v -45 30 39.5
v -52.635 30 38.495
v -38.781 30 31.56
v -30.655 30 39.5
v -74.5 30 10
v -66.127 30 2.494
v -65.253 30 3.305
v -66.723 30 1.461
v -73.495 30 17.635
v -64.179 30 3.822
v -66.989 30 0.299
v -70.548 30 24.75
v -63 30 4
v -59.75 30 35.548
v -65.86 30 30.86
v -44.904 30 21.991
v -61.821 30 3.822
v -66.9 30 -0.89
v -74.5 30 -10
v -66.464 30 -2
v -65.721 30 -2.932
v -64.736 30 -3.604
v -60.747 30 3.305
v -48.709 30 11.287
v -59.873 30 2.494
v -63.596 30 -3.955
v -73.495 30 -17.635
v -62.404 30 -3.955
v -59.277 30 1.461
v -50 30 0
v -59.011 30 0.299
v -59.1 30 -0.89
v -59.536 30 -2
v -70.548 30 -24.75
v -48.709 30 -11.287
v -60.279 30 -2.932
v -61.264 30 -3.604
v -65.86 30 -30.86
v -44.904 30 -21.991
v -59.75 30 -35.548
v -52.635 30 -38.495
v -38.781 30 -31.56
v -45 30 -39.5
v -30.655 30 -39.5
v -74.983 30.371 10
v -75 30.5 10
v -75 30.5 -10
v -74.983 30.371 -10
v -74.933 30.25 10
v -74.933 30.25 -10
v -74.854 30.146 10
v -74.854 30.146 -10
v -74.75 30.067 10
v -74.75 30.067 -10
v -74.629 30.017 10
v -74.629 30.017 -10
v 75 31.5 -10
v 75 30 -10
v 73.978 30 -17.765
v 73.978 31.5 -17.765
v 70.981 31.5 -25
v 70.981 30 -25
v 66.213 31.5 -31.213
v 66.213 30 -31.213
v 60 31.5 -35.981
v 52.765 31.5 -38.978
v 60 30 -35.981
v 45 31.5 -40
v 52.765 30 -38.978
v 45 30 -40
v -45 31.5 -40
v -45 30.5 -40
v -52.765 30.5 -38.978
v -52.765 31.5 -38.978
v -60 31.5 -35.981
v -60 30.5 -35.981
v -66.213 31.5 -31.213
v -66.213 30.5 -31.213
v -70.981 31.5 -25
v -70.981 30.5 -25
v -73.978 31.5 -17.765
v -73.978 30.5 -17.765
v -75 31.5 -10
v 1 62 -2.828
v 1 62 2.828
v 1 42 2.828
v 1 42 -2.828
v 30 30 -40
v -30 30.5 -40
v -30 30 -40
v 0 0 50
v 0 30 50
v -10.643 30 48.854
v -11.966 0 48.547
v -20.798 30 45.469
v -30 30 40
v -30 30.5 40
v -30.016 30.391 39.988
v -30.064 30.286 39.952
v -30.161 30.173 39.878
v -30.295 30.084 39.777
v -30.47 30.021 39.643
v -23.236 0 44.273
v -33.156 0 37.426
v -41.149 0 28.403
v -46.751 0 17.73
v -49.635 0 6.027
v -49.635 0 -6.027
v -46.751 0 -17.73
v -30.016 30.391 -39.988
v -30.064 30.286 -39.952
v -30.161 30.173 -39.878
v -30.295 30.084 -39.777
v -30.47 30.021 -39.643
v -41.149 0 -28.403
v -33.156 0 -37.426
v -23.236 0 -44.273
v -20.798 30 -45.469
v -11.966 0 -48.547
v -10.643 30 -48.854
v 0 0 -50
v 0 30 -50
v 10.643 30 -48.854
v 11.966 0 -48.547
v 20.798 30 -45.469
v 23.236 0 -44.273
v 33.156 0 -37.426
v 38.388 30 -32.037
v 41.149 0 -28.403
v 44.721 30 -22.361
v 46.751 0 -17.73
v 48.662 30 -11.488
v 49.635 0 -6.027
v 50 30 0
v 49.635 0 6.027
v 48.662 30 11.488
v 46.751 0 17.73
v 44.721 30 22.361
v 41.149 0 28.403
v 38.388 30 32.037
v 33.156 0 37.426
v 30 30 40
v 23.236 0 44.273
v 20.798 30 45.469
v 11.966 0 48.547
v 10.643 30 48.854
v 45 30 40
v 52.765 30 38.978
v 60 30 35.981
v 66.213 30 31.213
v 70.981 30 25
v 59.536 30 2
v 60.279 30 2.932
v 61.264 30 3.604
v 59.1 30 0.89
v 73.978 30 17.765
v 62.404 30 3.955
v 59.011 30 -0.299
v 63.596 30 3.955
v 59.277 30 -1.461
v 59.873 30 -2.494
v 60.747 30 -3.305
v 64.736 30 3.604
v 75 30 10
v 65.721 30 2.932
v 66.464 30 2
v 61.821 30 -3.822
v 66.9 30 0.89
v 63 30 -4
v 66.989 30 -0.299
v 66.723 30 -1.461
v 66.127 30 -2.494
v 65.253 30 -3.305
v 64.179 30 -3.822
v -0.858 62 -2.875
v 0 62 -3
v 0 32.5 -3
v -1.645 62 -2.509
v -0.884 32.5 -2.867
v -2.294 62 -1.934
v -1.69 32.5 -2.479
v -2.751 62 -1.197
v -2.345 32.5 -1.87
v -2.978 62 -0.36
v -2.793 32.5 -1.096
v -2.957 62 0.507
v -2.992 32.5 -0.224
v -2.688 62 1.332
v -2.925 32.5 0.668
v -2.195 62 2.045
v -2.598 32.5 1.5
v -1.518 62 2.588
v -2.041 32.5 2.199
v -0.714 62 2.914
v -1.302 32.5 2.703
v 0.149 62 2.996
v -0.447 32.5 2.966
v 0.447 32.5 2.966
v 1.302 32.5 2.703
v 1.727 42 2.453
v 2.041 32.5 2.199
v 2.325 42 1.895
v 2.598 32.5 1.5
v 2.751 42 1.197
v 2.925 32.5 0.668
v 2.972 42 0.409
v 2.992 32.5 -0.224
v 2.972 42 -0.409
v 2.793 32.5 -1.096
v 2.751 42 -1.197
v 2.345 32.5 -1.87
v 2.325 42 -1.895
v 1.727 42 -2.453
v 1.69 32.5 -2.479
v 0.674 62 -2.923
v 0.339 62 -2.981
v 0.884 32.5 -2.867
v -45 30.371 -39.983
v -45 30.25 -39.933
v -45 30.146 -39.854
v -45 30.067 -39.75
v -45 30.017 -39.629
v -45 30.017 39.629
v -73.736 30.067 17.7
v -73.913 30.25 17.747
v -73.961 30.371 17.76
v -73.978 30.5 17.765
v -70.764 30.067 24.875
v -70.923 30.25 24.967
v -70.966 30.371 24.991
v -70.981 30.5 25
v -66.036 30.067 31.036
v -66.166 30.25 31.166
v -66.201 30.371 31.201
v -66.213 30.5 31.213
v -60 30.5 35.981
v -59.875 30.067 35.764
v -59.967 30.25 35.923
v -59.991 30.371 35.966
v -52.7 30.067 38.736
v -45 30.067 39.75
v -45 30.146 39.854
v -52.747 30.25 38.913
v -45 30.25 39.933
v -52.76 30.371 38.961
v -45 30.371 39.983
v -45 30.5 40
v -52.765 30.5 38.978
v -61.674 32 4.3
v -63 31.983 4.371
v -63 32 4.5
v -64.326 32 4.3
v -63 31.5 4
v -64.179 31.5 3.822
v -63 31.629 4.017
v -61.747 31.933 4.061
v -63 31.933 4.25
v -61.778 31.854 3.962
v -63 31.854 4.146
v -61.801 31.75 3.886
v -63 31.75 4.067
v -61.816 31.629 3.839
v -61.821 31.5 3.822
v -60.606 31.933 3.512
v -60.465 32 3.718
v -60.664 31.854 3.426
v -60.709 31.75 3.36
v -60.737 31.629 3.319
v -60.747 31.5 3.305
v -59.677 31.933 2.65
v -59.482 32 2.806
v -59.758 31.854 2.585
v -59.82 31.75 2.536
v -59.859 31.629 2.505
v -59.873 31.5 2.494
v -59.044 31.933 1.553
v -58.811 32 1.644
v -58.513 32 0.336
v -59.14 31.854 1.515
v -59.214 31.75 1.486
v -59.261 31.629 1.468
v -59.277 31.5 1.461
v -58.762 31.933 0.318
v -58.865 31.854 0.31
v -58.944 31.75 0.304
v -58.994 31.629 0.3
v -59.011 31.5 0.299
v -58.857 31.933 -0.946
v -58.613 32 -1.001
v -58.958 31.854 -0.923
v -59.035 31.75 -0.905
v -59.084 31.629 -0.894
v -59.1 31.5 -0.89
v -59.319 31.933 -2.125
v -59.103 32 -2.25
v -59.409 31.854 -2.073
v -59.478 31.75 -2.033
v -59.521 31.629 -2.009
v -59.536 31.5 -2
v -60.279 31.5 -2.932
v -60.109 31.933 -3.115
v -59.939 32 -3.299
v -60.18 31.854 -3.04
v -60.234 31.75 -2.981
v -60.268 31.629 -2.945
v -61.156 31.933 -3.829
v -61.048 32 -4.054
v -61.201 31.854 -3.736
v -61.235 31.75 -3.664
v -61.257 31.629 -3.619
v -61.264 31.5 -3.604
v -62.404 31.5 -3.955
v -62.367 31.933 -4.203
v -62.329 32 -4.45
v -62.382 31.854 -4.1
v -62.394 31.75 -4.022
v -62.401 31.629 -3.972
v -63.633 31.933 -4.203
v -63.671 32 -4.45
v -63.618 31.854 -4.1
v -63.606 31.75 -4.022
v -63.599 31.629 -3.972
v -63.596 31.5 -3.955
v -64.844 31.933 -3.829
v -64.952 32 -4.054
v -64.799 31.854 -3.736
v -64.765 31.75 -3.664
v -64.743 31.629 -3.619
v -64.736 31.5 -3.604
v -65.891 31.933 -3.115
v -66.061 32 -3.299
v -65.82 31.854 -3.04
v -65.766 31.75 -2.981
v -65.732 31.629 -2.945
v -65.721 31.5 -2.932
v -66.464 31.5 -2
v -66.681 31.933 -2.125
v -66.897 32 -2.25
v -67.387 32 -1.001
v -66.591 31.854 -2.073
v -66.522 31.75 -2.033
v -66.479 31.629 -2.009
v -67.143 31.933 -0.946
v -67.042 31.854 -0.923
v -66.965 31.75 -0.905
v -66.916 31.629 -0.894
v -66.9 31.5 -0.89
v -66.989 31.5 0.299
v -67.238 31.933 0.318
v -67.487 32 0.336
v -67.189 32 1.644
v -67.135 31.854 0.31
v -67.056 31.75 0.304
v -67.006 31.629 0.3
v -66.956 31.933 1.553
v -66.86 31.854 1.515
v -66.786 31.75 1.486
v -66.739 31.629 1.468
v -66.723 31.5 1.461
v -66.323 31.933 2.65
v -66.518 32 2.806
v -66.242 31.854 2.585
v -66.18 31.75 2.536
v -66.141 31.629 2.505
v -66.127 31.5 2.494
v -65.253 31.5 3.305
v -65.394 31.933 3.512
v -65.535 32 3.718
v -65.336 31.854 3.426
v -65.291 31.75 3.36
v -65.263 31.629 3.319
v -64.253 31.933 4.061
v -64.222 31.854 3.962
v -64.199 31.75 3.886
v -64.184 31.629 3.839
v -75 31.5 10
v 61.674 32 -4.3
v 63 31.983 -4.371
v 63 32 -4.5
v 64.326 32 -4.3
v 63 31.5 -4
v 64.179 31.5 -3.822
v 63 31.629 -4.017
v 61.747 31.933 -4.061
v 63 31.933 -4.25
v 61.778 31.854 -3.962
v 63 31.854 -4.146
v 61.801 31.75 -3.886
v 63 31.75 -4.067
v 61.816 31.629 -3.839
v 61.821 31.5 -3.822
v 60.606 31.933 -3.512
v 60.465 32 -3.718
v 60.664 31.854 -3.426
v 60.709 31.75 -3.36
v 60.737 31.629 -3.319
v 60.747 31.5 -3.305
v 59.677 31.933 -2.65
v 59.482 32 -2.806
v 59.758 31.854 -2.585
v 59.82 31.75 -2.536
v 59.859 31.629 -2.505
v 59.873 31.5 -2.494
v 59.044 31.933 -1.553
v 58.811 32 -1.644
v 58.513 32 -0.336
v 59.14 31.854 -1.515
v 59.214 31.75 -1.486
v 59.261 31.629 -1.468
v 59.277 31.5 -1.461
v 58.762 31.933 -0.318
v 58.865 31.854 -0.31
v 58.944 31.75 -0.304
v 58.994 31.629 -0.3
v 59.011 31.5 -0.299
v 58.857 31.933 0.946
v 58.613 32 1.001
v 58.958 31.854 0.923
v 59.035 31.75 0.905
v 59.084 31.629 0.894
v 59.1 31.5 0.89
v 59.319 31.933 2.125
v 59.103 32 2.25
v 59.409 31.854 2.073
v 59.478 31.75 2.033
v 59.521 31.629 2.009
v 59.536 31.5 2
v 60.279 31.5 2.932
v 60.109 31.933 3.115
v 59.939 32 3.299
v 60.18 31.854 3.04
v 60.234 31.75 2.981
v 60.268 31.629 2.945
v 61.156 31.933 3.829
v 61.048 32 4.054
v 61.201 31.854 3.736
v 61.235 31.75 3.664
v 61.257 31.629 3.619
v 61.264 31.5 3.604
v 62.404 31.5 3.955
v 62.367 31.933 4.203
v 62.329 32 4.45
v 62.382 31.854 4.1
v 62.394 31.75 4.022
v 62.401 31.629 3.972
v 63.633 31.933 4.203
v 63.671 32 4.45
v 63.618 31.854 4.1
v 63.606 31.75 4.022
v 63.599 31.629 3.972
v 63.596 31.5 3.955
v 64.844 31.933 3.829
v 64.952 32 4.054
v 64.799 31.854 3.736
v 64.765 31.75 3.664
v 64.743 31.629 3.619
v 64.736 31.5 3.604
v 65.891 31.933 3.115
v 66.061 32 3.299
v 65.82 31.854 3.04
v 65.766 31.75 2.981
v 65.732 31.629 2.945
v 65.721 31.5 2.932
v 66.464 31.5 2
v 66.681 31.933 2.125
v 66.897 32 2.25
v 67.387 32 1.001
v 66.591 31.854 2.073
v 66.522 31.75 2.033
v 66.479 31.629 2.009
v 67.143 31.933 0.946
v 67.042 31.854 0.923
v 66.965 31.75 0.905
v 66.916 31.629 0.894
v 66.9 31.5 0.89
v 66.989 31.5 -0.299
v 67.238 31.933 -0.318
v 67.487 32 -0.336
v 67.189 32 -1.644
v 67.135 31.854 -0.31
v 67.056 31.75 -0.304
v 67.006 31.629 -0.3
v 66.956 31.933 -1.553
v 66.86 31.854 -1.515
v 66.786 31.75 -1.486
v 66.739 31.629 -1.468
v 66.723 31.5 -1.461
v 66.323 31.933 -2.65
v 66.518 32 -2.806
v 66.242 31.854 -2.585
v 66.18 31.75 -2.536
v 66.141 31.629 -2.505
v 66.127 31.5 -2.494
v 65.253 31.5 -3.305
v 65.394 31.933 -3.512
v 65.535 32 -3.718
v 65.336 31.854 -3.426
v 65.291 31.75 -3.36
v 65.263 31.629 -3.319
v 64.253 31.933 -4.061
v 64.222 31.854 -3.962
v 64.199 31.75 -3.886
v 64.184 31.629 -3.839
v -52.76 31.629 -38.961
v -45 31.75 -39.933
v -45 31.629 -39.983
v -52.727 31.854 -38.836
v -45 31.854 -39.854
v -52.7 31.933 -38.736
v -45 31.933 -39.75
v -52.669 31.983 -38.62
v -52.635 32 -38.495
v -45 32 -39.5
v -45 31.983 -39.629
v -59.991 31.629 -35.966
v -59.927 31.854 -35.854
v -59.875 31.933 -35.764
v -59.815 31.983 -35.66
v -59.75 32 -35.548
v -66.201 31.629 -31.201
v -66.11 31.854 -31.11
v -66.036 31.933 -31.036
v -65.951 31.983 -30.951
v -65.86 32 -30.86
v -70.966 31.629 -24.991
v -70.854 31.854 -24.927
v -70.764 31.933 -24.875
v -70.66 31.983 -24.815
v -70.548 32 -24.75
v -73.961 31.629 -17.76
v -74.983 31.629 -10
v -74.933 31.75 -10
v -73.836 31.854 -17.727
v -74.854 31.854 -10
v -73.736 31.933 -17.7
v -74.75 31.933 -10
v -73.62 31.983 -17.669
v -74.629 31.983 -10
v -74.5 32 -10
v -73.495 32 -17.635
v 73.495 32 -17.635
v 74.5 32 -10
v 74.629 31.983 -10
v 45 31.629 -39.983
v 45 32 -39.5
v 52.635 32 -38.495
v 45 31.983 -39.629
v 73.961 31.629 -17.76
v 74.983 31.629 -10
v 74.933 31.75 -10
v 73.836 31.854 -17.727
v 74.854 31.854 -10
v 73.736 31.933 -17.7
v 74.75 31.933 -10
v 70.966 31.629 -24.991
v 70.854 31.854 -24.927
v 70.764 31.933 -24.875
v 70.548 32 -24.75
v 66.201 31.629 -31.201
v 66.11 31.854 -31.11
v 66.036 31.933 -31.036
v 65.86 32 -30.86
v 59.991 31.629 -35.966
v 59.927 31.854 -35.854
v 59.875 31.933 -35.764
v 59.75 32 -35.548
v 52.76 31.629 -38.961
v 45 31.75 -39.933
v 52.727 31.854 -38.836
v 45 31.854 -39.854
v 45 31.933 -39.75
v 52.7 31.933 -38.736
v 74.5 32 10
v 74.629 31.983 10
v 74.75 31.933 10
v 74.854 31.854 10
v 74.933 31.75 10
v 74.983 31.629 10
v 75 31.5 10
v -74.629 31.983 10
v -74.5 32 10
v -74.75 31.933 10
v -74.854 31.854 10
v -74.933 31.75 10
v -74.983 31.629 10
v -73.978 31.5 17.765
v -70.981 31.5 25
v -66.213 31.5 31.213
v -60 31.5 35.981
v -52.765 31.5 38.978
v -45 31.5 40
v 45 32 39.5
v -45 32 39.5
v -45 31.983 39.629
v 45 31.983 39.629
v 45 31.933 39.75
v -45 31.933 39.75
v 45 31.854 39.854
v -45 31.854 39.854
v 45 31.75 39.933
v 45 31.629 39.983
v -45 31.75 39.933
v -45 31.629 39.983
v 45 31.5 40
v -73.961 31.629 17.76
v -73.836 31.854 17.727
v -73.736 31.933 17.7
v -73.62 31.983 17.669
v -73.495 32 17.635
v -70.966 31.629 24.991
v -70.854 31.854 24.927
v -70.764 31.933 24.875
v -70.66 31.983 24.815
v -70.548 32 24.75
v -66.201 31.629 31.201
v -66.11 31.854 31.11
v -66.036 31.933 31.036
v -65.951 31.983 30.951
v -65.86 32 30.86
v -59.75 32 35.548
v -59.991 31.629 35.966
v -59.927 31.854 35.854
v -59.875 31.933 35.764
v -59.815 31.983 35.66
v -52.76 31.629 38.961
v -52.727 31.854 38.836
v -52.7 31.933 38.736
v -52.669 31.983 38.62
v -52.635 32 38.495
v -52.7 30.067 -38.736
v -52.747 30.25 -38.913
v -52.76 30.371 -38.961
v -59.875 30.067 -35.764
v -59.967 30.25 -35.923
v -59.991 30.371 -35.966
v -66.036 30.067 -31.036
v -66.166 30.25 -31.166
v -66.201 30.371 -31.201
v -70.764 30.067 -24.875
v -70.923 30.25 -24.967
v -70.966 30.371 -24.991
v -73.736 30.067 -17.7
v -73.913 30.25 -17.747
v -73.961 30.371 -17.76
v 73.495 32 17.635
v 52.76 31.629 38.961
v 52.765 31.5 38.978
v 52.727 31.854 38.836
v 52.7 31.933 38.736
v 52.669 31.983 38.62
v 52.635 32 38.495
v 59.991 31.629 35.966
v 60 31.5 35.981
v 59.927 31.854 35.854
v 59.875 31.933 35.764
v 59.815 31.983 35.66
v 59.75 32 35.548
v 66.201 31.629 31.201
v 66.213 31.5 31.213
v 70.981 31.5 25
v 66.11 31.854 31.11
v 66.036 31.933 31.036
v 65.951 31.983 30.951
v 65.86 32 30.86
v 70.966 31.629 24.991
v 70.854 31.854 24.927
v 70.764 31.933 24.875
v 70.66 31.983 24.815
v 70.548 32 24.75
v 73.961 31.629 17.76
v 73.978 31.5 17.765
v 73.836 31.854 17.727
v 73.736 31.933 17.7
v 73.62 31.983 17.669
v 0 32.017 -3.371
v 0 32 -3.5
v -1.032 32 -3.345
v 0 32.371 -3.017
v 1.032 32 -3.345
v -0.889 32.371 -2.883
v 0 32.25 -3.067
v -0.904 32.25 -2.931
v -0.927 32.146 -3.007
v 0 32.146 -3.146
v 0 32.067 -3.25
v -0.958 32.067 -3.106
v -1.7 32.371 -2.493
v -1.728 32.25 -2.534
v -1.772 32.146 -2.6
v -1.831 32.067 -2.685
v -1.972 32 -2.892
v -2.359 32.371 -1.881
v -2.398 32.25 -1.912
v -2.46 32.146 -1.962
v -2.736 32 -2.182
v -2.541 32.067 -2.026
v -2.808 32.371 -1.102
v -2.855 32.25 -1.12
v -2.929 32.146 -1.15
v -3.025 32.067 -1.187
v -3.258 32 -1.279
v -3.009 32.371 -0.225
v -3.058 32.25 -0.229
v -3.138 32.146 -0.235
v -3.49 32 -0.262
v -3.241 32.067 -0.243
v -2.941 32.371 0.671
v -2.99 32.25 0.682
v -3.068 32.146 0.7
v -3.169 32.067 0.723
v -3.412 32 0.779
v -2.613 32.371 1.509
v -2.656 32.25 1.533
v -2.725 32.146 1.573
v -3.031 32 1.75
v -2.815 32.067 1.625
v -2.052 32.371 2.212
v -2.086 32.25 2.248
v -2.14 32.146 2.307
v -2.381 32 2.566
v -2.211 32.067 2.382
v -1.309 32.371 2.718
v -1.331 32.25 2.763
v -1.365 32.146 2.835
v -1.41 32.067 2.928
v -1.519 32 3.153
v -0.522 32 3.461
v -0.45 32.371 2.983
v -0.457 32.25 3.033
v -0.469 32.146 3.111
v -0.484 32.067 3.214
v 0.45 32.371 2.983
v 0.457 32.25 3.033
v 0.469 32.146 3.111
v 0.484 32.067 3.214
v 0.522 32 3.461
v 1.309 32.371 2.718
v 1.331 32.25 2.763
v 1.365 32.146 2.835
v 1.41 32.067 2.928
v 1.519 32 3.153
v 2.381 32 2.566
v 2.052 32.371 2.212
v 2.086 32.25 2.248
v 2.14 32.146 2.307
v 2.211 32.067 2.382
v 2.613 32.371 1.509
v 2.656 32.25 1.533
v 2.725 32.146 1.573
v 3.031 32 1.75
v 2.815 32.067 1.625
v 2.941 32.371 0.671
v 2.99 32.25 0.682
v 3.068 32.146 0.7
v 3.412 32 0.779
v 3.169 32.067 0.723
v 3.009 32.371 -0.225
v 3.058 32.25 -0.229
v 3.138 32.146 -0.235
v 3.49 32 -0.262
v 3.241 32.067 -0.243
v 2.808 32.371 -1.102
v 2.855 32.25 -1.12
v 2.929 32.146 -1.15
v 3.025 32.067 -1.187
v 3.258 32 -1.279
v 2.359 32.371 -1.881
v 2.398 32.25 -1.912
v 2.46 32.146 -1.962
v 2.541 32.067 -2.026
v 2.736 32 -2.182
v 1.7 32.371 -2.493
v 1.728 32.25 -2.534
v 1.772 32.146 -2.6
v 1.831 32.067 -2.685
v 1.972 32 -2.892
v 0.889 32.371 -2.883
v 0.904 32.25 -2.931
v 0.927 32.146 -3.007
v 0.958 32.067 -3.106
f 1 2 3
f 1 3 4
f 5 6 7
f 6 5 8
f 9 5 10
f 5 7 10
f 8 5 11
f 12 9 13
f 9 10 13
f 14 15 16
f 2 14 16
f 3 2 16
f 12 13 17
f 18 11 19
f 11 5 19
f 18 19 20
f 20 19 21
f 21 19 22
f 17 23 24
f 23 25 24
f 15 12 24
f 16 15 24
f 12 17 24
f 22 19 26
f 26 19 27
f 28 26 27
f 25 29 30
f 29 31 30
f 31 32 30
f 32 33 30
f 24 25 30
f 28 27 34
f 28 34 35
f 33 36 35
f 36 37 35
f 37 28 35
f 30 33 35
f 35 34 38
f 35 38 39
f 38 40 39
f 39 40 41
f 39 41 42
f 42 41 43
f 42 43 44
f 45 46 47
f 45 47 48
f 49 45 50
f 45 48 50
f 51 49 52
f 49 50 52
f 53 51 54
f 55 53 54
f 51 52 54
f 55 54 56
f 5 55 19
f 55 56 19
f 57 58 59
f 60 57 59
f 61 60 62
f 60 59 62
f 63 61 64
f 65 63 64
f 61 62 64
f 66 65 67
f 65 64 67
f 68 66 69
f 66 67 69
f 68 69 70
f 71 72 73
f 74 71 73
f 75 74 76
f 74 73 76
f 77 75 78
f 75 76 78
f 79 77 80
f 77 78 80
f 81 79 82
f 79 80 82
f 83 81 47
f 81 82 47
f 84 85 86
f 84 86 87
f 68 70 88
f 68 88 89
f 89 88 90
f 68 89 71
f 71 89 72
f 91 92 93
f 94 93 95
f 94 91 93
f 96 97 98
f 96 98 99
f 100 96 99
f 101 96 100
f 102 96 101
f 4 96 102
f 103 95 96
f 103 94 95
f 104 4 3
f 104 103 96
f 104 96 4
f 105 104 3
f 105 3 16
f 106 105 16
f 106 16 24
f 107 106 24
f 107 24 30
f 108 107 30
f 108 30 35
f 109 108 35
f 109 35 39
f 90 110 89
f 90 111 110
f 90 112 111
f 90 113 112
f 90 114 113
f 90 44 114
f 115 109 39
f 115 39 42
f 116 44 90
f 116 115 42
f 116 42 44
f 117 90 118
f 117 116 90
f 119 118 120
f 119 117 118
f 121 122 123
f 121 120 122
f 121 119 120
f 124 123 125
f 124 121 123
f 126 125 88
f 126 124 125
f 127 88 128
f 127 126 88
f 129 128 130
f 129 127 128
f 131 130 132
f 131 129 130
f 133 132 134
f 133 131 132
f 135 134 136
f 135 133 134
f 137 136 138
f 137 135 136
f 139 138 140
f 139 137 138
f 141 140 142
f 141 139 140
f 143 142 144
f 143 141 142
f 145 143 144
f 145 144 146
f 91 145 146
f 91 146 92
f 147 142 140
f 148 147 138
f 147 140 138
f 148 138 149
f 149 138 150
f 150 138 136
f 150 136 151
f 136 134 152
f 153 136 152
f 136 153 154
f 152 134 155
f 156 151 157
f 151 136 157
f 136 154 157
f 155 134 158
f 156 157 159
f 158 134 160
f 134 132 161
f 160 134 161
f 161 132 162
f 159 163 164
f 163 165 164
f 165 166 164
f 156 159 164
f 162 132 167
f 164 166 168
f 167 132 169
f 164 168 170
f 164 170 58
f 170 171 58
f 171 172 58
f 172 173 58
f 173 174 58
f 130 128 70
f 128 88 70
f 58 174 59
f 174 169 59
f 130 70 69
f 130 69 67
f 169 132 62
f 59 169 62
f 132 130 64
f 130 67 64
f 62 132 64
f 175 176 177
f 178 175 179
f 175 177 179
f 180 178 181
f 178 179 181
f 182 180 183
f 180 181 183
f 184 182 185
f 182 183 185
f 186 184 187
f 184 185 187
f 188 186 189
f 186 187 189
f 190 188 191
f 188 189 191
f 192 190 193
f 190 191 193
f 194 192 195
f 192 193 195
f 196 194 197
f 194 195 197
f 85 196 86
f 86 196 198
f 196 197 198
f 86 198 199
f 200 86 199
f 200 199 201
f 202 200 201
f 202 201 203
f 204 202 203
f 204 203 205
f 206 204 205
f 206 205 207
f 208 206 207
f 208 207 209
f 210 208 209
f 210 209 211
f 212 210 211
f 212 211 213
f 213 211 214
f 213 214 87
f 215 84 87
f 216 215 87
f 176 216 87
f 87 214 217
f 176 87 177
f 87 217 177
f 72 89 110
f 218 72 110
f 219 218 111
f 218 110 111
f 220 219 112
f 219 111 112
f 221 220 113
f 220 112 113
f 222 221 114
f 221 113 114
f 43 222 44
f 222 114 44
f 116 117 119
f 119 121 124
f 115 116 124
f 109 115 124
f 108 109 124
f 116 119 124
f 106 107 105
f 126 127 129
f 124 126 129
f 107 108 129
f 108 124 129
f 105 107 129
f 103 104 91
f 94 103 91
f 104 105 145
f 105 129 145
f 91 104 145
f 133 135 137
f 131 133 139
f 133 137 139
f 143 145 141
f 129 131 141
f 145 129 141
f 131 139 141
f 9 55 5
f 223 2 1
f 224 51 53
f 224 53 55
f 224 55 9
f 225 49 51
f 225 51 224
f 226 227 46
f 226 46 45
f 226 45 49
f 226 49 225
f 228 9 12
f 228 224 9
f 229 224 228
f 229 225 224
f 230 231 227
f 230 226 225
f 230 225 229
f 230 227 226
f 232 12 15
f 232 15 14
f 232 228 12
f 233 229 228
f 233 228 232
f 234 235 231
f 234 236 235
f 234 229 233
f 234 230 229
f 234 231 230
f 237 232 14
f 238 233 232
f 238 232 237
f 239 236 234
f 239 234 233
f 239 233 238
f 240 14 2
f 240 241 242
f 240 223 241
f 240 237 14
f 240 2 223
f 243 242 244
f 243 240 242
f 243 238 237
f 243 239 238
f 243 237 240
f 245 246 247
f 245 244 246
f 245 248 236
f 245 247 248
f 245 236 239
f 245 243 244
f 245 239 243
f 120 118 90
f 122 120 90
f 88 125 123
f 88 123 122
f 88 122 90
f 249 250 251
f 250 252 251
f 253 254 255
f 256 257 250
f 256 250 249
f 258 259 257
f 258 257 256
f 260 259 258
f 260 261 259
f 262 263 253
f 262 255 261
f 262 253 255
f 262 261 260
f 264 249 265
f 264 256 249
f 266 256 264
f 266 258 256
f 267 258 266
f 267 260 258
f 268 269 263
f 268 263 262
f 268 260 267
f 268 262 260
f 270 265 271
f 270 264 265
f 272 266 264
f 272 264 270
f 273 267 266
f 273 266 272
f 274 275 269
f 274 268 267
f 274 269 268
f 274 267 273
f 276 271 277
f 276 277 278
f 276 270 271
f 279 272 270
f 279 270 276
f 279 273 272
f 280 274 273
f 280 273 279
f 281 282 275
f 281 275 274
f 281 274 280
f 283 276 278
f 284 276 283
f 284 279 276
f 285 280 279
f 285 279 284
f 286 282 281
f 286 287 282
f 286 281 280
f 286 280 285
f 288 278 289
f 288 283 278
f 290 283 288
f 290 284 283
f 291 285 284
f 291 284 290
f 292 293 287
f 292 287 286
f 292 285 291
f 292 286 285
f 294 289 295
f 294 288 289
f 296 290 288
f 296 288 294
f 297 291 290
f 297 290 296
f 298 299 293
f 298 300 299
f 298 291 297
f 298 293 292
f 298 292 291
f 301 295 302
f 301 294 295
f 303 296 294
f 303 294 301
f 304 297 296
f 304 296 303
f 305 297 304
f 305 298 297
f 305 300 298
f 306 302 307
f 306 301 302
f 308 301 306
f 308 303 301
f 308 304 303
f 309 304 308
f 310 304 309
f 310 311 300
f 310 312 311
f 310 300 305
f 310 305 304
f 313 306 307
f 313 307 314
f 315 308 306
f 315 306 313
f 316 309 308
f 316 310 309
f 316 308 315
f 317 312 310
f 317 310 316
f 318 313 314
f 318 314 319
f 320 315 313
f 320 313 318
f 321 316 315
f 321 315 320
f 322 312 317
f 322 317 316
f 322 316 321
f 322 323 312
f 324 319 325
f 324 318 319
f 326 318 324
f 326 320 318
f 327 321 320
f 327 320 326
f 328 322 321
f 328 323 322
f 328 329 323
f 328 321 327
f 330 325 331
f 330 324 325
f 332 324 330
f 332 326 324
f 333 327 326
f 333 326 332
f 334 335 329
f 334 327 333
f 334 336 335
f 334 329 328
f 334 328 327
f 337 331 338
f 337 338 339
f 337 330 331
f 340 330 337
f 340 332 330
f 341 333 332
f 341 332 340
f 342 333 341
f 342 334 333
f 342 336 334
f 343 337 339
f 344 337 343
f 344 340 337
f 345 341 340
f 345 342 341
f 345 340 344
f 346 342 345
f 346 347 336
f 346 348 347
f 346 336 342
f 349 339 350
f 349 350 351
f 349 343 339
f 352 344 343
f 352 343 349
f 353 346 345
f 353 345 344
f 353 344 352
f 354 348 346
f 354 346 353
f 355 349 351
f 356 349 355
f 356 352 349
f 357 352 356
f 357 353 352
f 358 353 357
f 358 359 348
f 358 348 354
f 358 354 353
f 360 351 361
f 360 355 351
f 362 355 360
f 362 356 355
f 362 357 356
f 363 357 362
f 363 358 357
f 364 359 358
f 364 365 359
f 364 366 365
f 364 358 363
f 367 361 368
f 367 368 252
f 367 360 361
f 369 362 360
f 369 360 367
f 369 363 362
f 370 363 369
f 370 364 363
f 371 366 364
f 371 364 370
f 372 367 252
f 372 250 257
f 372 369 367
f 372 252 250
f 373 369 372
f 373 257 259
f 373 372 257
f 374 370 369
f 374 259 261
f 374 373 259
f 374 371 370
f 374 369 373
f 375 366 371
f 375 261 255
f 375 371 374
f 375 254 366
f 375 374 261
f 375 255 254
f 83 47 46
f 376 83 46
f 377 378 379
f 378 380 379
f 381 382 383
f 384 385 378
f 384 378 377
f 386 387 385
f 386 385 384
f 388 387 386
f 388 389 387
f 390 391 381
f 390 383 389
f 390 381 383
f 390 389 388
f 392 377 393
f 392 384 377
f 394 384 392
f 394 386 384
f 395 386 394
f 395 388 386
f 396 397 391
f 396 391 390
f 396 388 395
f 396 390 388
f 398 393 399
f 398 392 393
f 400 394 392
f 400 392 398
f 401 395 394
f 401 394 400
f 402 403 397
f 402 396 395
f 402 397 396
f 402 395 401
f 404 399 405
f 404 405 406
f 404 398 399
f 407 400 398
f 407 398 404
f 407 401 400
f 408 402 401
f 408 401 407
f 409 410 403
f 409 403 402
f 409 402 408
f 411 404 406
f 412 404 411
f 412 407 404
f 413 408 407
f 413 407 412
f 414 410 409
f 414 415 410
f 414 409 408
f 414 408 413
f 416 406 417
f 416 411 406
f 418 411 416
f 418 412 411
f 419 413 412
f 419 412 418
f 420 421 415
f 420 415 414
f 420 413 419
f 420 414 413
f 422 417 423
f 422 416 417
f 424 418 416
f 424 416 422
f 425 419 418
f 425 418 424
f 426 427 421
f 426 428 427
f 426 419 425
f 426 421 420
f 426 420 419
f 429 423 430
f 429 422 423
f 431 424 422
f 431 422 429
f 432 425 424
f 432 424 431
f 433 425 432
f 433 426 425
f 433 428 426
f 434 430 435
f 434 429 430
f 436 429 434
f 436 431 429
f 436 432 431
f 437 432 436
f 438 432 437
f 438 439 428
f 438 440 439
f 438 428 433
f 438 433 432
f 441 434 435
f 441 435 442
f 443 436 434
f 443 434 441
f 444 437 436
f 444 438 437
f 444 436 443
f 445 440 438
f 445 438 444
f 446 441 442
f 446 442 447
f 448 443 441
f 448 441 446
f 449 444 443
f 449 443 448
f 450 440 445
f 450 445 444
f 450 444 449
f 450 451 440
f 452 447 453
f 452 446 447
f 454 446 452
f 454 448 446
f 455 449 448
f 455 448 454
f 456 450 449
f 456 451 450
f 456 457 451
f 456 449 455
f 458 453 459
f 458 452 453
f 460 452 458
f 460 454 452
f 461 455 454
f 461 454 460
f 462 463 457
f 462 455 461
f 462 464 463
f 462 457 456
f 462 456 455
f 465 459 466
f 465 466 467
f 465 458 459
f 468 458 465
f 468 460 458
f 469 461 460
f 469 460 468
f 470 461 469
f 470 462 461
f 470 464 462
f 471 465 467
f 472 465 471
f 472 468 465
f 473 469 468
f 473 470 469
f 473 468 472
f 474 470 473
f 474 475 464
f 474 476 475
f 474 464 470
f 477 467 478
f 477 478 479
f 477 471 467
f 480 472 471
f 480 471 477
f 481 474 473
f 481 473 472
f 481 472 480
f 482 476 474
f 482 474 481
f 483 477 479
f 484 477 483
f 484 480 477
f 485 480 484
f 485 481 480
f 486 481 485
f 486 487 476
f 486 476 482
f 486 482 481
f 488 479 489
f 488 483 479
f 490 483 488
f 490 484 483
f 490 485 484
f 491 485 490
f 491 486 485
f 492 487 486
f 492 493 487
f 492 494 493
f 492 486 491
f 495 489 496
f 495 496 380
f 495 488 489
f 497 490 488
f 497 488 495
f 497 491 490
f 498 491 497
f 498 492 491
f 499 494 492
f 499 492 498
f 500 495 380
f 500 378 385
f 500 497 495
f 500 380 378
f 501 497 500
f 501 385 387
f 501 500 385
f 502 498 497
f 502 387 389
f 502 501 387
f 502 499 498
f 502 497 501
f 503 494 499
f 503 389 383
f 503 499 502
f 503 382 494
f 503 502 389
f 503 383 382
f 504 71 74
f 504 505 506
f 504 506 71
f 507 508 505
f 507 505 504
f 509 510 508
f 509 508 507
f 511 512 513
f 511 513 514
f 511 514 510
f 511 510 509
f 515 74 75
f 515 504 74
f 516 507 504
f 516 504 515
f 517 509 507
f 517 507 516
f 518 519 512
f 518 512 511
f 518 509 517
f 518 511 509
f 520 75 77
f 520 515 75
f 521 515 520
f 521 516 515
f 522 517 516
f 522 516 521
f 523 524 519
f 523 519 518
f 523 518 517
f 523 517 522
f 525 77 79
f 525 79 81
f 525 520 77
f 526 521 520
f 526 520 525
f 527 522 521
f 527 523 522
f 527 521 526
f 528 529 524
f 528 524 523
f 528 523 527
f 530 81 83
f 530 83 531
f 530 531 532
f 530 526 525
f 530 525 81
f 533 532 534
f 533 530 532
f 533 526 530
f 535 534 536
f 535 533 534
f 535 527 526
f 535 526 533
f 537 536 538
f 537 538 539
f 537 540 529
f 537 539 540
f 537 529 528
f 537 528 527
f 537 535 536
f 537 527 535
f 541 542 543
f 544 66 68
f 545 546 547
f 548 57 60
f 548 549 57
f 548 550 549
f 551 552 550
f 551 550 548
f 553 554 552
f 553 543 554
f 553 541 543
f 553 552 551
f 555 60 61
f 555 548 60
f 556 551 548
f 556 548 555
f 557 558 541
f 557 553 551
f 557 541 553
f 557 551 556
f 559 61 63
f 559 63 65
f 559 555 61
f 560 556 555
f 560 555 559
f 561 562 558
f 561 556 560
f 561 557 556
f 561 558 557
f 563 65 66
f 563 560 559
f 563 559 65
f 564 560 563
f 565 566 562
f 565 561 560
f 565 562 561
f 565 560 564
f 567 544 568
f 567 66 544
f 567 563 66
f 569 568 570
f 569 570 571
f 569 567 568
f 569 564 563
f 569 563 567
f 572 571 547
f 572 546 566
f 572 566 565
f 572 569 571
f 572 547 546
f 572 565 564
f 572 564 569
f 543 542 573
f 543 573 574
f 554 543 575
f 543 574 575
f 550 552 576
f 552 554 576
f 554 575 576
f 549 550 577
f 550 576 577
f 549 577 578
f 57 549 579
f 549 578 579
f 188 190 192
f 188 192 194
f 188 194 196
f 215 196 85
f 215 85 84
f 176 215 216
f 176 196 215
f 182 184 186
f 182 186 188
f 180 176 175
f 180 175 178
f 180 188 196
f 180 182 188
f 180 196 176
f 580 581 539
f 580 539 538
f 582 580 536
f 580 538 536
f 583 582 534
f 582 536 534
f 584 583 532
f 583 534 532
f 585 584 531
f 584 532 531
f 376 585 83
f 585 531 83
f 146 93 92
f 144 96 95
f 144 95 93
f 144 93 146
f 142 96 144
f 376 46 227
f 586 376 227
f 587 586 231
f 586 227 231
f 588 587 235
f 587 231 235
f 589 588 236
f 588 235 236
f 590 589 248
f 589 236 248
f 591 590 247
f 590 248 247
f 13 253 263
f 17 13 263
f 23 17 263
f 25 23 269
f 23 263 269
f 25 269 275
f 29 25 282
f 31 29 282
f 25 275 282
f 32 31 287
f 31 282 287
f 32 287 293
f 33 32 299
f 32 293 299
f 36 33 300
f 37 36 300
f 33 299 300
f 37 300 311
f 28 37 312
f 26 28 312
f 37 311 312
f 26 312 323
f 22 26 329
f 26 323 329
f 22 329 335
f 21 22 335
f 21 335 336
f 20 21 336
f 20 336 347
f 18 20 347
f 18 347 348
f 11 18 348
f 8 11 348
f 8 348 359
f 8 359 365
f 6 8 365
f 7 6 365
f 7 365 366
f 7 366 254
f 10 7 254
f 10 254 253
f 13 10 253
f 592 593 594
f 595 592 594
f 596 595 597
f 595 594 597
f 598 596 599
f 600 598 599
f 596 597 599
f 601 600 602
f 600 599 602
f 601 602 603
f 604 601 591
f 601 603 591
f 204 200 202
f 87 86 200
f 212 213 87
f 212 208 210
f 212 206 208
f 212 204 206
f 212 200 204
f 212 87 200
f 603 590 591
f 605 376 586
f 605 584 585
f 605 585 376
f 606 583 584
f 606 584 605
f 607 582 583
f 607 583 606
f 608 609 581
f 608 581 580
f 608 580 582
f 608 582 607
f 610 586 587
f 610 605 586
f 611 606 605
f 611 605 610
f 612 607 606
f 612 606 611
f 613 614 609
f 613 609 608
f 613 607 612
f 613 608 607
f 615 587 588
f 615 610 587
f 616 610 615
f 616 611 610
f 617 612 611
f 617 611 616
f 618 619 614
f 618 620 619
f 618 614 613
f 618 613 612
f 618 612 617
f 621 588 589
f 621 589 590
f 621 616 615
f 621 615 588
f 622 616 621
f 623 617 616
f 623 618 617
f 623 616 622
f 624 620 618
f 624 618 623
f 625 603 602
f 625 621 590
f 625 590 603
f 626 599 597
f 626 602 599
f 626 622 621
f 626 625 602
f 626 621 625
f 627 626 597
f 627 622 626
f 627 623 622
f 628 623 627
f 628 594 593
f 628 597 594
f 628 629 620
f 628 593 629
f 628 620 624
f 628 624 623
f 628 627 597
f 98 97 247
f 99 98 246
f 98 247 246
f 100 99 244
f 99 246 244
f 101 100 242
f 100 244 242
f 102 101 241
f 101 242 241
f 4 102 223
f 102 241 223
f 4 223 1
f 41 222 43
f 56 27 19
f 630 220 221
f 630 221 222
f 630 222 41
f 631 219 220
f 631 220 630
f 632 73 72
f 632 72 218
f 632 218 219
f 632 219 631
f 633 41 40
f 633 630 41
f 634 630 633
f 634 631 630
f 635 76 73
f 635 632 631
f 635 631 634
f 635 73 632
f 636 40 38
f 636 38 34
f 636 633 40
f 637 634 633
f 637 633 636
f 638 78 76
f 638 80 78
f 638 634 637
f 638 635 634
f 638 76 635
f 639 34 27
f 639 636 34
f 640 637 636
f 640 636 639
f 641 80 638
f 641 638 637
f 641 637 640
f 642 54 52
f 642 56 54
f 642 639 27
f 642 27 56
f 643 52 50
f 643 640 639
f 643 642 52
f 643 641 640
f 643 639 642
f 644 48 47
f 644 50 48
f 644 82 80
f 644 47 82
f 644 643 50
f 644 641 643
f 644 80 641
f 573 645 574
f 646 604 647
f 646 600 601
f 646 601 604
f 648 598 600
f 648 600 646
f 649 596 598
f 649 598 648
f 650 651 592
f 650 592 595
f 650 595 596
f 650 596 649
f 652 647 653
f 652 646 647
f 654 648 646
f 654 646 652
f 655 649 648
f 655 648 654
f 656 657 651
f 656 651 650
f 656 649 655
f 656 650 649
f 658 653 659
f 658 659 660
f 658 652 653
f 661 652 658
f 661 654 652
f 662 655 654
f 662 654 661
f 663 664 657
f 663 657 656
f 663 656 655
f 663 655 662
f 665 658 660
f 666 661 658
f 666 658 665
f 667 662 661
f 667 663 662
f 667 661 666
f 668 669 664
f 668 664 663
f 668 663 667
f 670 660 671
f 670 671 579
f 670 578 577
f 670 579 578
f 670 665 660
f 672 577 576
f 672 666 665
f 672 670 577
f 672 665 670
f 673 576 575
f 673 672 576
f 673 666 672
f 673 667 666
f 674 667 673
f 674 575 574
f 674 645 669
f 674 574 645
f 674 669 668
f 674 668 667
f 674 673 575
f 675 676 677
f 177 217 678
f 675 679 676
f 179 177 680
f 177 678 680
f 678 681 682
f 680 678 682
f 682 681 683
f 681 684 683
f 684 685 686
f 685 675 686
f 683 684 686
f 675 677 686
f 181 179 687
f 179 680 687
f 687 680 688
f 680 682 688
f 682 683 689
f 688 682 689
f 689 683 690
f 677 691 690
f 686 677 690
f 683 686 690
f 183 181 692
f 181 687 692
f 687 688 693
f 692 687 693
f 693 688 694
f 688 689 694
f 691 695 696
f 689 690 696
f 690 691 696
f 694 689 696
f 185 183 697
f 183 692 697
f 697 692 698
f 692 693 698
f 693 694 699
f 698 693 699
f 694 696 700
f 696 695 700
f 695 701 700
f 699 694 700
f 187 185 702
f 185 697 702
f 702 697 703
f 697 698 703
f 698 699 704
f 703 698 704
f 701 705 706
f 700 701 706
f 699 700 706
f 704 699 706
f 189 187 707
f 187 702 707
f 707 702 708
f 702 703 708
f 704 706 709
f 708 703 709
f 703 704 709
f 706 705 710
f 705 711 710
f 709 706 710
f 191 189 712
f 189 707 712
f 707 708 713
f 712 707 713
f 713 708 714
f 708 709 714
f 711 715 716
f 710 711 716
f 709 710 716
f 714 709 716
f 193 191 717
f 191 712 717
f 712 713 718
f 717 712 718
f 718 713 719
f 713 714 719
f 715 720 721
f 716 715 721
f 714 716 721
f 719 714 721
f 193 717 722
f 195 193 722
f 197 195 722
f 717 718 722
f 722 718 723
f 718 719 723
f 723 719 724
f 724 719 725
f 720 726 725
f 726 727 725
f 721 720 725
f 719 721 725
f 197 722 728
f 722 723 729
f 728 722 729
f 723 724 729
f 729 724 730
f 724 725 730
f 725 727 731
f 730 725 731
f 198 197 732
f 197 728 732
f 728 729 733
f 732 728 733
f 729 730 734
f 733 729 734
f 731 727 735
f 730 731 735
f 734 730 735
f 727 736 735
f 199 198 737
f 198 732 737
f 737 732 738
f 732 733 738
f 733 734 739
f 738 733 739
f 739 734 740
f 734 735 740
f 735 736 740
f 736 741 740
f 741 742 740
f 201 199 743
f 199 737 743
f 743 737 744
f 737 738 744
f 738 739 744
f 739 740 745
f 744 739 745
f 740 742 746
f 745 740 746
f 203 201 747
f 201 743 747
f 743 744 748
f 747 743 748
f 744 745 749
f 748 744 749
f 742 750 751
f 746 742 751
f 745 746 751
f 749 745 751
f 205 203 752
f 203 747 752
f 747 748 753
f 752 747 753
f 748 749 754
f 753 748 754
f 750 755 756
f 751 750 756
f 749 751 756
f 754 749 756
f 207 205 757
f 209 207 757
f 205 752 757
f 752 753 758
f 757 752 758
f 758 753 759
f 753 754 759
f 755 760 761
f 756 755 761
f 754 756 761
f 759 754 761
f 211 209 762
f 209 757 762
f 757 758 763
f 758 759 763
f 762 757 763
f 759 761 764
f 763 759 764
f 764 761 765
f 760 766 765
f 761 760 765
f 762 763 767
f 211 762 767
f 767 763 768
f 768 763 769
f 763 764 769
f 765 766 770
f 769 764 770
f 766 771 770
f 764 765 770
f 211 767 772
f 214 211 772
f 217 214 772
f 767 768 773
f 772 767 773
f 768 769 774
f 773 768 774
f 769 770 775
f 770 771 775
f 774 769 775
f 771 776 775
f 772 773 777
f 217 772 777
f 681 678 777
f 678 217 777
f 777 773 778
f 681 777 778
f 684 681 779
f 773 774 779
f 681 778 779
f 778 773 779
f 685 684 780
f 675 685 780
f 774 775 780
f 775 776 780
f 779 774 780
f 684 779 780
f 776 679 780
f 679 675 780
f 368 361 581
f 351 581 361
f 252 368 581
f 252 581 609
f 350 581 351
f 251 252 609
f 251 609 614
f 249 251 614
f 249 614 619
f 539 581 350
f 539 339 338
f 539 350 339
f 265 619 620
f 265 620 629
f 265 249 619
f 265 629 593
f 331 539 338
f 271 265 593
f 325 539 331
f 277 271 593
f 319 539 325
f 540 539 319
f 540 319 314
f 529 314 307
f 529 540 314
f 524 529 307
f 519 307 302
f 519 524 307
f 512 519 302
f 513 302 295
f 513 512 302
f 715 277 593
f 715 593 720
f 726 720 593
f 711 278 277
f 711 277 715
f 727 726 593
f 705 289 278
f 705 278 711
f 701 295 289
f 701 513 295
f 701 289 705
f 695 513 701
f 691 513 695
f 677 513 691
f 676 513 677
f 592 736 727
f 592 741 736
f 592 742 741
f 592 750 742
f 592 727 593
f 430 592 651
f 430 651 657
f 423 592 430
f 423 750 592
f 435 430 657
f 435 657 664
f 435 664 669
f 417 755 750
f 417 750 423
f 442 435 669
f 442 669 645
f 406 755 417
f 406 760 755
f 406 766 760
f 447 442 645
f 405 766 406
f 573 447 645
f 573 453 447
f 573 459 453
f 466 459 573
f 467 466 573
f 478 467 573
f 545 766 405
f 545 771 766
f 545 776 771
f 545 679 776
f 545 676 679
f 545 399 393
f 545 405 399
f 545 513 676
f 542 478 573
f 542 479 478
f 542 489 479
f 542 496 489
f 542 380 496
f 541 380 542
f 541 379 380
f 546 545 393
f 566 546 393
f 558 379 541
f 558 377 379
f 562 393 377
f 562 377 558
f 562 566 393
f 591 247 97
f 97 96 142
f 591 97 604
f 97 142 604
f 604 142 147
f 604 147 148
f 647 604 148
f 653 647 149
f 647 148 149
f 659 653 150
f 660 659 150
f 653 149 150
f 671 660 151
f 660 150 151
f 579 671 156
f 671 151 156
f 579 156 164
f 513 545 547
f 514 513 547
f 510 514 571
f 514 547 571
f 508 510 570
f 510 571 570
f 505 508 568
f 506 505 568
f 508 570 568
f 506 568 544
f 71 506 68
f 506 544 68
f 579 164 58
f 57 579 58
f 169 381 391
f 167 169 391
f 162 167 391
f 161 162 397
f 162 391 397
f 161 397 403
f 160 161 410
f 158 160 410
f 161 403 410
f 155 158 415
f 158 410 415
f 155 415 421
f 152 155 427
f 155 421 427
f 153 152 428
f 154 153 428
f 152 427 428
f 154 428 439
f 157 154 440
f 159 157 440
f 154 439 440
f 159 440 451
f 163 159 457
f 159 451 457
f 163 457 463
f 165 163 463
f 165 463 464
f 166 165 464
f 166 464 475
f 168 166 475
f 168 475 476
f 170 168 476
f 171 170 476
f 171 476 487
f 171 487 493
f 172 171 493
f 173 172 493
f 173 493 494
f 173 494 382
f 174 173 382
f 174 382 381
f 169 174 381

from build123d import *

# Parameters (mm, degrees)
ESBO_O1_R                = 50
RESSALTO_EXTRUS_O1_DEPTH = 30
RESSALTO_EXTRUS_O2_DEPTH = 2
ESBO_O3_R                = 3
RESSALTO_EXTRUS_O3_DEPTH = 30
ESBO_O4_W                = 2.913486889
ESBO_O4_H                = 6.765215319
CORTE_EXTRUS_O1_DEPTH    = 20
CORTE_EXTRUS_O2_REACH    = 97.65
ESBO_O6_R                = 4
FILETE2_R                = 0.5


with BuildPart() as part:
    # Esboço1 → Ressalto-extrusão1 (new body)
    with BuildSketch(Plane(origin=(0, 0, 0), x_dir=(1, 0, 0), z_dir=(0, 1, 0))):
        with Locations(Location((0, 0, 0), (0, 0, 270))):
            Circle(ESBO_O1_R)
    extrude(amount=RESSALTO_EXTRUS_O1_DEPTH)

    # Esboço2 → Ressalto-extrusão2 (add)
    with BuildSketch(Plane(origin=(0, 30, 0), x_dir=(1, 0, 0), z_dir=(0, 1, 0))):
        with BuildLine():
            Line((-45, -40), (45, -40))
            ThreePointArc((45, -40), (66.213203436, -31.213203436), (75, -10))
            Line((75, -10), (75, 10))
            ThreePointArc((75, 10), (66.213203436, 31.213203436), (45, 40))
            Line((45, 40), (-45, 40))
            ThreePointArc((-45, 40), (-66.213203436, 31.213203436), (-75, 10))
            Line((-75, 10), (-75, -10))
            ThreePointArc((-75, -10), (-66.213203436, -31.213203436), (-45, -40))
        make_face()
    extrude(amount=RESSALTO_EXTRUS_O2_DEPTH)

    # Esboço3 → Ressalto-extrusão3 (add)
    with BuildSketch(Plane(origin=(0, 32, 0), x_dir=(1, 0, 0), z_dir=(0, 1, 0))):
        with Locations(Location((0, 0, 0), (0, 0, 90))):
            Circle(ESBO_O3_R)
    extrude(amount=RESSALTO_EXTRUS_O3_DEPTH)

    # Esboço4 → Corte-extrusão1 (cut)
    with BuildSketch(Plane(origin=(0, 62, 0), x_dir=(1, 0, 0), z_dir=(0, 1, 0))):
        with Locations((2.456743444, -0.010763652)):
            Rectangle(ESBO_O4_W, ESBO_O4_H)
    extrude(amount=-CORTE_EXTRUS_O1_DEPTH, mode=Mode.SUBTRACT)

    # Esboço6 → Corte-extrusão2 (cut, up to next)
    with BuildSketch(Plane(origin=(0, 32, 0), x_dir=(1, 0, 0), z_dir=(0, 1, 0)), mode=Mode.PRIVATE) as corte_extrus_o2_sk1:
        with Locations(Location((-63, 0, 0), (0, 0, 270))):
            Circle(ESBO_O6_R)
    corte_extrus_o2_tool1 = extrude(corte_extrus_o2_sk1.sketch, amount=-CORTE_EXTRUS_O2_REACH, mode=Mode.PRIVATE) & part.part
    # Esboço6 → Corte-extrusão2 (cut, up to next)
    with BuildSketch(Plane(origin=(0, 32, 0), x_dir=(1, 0, 0), z_dir=(0, 1, 0)), mode=Mode.PRIVATE) as corte_extrus_o2_sk2:
        with Locations(Location((63, 0, 0), (0, 0, 90))):
            Circle(ESBO_O6_R)
    corte_extrus_o2_tool2 = extrude(corte_extrus_o2_sk2.sketch, amount=-CORTE_EXTRUS_O2_REACH, mode=Mode.PRIVATE) & part.part
    add(corte_extrus_o2_tool1.solids().sort_by_distance((-63, 32, 0))[0], mode=Mode.SUBTRACT)
    add(corte_extrus_o2_tool2.solids().sort_by_distance((63, 32, 0))[0], mode=Mode.SUBTRACT)

    # Filete2
    # the kernel refuses this fillet: 0.5 mm, written as the material it adds along each edge
    with BuildSketch(Plane(origin=(0, 32, 0), x_dir=(0, 0, -1), z_dir=(1, 0, 0))) as filete2_piece_1:
        with BuildLine():
            CenterArc((3 + FILETE2_R, FILETE2_R), FILETE2_R, 180, 90)
            Line((3, FILETE2_R), (3, 0))
            Line((3, 0), (3 + FILETE2_R, 0))
        make_face()
    revolve(axis=Axis((0, 32, 0), (0, 1, 0)))
    # the kernel refuses this fillet: 0.5 mm, written as the material it takes off along each edge
    with BuildSketch(Plane(origin=(-45, 30, 40), x_dir=(0, 0, -1), z_dir=(1, 0, 0))) as filete2_2_piece_1_section:
        with BuildLine():
            CenterArc((FILETE2_R, FILETE2_R), FILETE2_R, 180, 90)
            Line((0, FILETE2_R), (0, 0))
            Line((0, 0), (FILETE2_R, 0))
        make_face()
    filete2_2_piece_1 = extrude(amount=16.25, mode=Mode.PRIVATE)
    filete2_2_piece_1 = filete2_2_piece_1 - Plane(origin=(0, 30.083724815, 0), x_dir=(0, 0, 1), z_dir=(0, -1, 0)) * Cylinder(50, 35, mode=Mode.PRIVATE)
    add(filete2_2_piece_1, mode=Mode.SUBTRACT)
    with BuildSketch(Plane(origin=(45, 32, -10), x_dir=(1, 0, 0), z_dir=(0, 0, 1))) as filete2_2_piece_2:
        with BuildLine():
            CenterArc((30 - FILETE2_R, -FILETE2_R), FILETE2_R, 0, 90)
            Line((30 - FILETE2_R, 0), (30, 0))
            Line((30, 0), (30, -FILETE2_R))
        make_face()
    revolve(axis=Axis((45, 32, -10), (0, 1, 0)), revolution_arc=90, mode=Mode.SUBTRACT)
    with BuildSketch(Plane(origin=(45, 32, -40), x_dir=(0, -1, 0), z_dir=(-1, 0, 0)), Plane(origin=(-45, 32, 40), x_dir=(0, -1, 0), z_dir=(1, 0, 0))) as filete2_2_piece_3:
        with BuildLine():
            CenterArc((FILETE2_R, FILETE2_R), FILETE2_R, 180, 90)
            Line((0, FILETE2_R), (0, 0))
            Line((0, 0), (FILETE2_R, 0))
        make_face()
    extrude(amount=90, mode=Mode.SUBTRACT)
    with BuildSketch(Plane(origin=(-45, 32, -10), x_dir=(0, 0, -1), z_dir=(1, 0, 0))) as filete2_2_piece_4:
        with BuildLine():
            CenterArc((30 - FILETE2_R, -FILETE2_R), FILETE2_R, 0, 90)
            Line((30 - FILETE2_R, 0), (30, 0))
            Line((30, 0), (30, -FILETE2_R))
        make_face()
    revolve(axis=Axis((-45, 32, -10), (0, 1, 0)), revolution_arc=90, mode=Mode.SUBTRACT)
    with BuildSketch(Plane(origin=(-75, 32, -10), x_dir=(0, -1, 0), z_dir=(0, 0, 1)), Plane(origin=(75, 32, 10), x_dir=(0, -1, 0), z_dir=(0, 0, -1)), Plane(origin=(-75, 30, -10), x_dir=(1, 0, 0), z_dir=(0, 0, 1))) as filete2_2_piece_5:
        with BuildLine():
            CenterArc((FILETE2_R, FILETE2_R), FILETE2_R, 180, 90)
            Line((0, FILETE2_R), (0, 0))
            Line((0, 0), (FILETE2_R, 0))
        make_face()
    extrude(amount=20, mode=Mode.SUBTRACT)
    with BuildSketch(Plane(origin=(-45, 32, 10), x_dir=(-1, 0, 0), z_dir=(0, 0, -1))) as filete2_2_piece_6:
        with BuildLine():
            CenterArc((30 - FILETE2_R, -FILETE2_R), FILETE2_R, 0, 90)
            Line((30 - FILETE2_R, 0), (30, 0))
            Line((30, 0), (30, -FILETE2_R))
        make_face()
    revolve(axis=Axis((-45, 32, 10), (0, 1, 0)), revolution_arc=90, mode=Mode.SUBTRACT)
    with BuildSketch(Plane(origin=(45, 32, 10), x_dir=(0, 0, 1), z_dir=(-1, 0, 0))) as filete2_2_piece_7:
        with BuildLine():
            CenterArc((30 - FILETE2_R, -FILETE2_R), FILETE2_R, 0, 90)
            Line((30 - FILETE2_R, 0), (30, 0))
            Line((30, 0), (30, -FILETE2_R))
        make_face()
    revolve(axis=Axis((45, 32, 10), (0, 1, 0)), revolution_arc=90, mode=Mode.SUBTRACT)
    with BuildSketch(Plane(origin=(-63, 32, 0), x_dir=(0, 0, 1), z_dir=(-1, 0, 0))) as filete2_2_piece_8:
        with BuildLine():
            CenterArc((4 + FILETE2_R, -FILETE2_R), FILETE2_R, 90, 90)
            Line((4 + FILETE2_R, 0), (4, 0))
            Line((4, 0), (4, -FILETE2_R))
        make_face()
    revolve(axis=Axis((-63, 32, 0), (0, 1, 0)), mode=Mode.SUBTRACT)
    with BuildSketch(Plane(origin=(63, 32, 0), x_dir=(0, 0, -1), z_dir=(1, 0, 0))) as filete2_2_piece_9:
        with BuildLine():
            CenterArc((4 + FILETE2_R, -FILETE2_R), FILETE2_R, 90, 90)
            Line((4 + FILETE2_R, 0), (4, 0))
            Line((4, 0), (4, -FILETE2_R))
        make_face()
    revolve(axis=Axis((63, 32, 0), (0, 1, 0)), mode=Mode.SUBTRACT)
    with BuildSketch(Plane(origin=(-28.75, 30, -40), x_dir=(0, 0, 1), z_dir=(-1, 0, 0))) as filete2_2_piece_10_section:
        with BuildLine():
            CenterArc((FILETE2_R, FILETE2_R), FILETE2_R, 180, 90)
            Line((0, FILETE2_R), (0, 0))
            Line((0, 0), (FILETE2_R, 0))
        make_face()
    filete2_2_piece_10 = extrude(amount=16.25, mode=Mode.PRIVATE)
    filete2_2_piece_10 = filete2_2_piece_10 - Plane(origin=(0, 30.117437767, 0), x_dir=(0, 0, 1), z_dir=(0, -1, 0)) * Cylinder(50, 35, mode=Mode.PRIVATE)
    add(filete2_2_piece_10, mode=Mode.SUBTRACT)
    with BuildSketch(Plane(origin=(-45, 30, -10), x_dir=(0, 0, -1), z_dir=(1, 0, 0))) as filete2_2_piece_11:
        with BuildLine():
            CenterArc((30 - FILETE2_R, FILETE2_R), FILETE2_R, 270, 90)
            Line((30, FILETE2_R), (30, 0))
            Line((30, 0), (30 - FILETE2_R, 0))
        make_face()
    revolve(axis=Axis((-45, 30, -10), (0, 1, 0)), revolution_arc=90, mode=Mode.SUBTRACT)
    with BuildSketch(Plane(origin=(-45, 30, 10), x_dir=(-1, 0, 0), z_dir=(0, 0, -1))) as filete2_2_piece_12:
        with BuildLine():
            CenterArc((30 - FILETE2_R, FILETE2_R), FILETE2_R, 270, 90)
            Line((30, FILETE2_R), (30, 0))
            Line((30, 0), (30 - FILETE2_R, 0))
        make_face()
    revolve(axis=Axis((-45, 30, 10), (0, 1, 0)), revolution_arc=90, mode=Mode.SUBTRACT)


solid = part.part
